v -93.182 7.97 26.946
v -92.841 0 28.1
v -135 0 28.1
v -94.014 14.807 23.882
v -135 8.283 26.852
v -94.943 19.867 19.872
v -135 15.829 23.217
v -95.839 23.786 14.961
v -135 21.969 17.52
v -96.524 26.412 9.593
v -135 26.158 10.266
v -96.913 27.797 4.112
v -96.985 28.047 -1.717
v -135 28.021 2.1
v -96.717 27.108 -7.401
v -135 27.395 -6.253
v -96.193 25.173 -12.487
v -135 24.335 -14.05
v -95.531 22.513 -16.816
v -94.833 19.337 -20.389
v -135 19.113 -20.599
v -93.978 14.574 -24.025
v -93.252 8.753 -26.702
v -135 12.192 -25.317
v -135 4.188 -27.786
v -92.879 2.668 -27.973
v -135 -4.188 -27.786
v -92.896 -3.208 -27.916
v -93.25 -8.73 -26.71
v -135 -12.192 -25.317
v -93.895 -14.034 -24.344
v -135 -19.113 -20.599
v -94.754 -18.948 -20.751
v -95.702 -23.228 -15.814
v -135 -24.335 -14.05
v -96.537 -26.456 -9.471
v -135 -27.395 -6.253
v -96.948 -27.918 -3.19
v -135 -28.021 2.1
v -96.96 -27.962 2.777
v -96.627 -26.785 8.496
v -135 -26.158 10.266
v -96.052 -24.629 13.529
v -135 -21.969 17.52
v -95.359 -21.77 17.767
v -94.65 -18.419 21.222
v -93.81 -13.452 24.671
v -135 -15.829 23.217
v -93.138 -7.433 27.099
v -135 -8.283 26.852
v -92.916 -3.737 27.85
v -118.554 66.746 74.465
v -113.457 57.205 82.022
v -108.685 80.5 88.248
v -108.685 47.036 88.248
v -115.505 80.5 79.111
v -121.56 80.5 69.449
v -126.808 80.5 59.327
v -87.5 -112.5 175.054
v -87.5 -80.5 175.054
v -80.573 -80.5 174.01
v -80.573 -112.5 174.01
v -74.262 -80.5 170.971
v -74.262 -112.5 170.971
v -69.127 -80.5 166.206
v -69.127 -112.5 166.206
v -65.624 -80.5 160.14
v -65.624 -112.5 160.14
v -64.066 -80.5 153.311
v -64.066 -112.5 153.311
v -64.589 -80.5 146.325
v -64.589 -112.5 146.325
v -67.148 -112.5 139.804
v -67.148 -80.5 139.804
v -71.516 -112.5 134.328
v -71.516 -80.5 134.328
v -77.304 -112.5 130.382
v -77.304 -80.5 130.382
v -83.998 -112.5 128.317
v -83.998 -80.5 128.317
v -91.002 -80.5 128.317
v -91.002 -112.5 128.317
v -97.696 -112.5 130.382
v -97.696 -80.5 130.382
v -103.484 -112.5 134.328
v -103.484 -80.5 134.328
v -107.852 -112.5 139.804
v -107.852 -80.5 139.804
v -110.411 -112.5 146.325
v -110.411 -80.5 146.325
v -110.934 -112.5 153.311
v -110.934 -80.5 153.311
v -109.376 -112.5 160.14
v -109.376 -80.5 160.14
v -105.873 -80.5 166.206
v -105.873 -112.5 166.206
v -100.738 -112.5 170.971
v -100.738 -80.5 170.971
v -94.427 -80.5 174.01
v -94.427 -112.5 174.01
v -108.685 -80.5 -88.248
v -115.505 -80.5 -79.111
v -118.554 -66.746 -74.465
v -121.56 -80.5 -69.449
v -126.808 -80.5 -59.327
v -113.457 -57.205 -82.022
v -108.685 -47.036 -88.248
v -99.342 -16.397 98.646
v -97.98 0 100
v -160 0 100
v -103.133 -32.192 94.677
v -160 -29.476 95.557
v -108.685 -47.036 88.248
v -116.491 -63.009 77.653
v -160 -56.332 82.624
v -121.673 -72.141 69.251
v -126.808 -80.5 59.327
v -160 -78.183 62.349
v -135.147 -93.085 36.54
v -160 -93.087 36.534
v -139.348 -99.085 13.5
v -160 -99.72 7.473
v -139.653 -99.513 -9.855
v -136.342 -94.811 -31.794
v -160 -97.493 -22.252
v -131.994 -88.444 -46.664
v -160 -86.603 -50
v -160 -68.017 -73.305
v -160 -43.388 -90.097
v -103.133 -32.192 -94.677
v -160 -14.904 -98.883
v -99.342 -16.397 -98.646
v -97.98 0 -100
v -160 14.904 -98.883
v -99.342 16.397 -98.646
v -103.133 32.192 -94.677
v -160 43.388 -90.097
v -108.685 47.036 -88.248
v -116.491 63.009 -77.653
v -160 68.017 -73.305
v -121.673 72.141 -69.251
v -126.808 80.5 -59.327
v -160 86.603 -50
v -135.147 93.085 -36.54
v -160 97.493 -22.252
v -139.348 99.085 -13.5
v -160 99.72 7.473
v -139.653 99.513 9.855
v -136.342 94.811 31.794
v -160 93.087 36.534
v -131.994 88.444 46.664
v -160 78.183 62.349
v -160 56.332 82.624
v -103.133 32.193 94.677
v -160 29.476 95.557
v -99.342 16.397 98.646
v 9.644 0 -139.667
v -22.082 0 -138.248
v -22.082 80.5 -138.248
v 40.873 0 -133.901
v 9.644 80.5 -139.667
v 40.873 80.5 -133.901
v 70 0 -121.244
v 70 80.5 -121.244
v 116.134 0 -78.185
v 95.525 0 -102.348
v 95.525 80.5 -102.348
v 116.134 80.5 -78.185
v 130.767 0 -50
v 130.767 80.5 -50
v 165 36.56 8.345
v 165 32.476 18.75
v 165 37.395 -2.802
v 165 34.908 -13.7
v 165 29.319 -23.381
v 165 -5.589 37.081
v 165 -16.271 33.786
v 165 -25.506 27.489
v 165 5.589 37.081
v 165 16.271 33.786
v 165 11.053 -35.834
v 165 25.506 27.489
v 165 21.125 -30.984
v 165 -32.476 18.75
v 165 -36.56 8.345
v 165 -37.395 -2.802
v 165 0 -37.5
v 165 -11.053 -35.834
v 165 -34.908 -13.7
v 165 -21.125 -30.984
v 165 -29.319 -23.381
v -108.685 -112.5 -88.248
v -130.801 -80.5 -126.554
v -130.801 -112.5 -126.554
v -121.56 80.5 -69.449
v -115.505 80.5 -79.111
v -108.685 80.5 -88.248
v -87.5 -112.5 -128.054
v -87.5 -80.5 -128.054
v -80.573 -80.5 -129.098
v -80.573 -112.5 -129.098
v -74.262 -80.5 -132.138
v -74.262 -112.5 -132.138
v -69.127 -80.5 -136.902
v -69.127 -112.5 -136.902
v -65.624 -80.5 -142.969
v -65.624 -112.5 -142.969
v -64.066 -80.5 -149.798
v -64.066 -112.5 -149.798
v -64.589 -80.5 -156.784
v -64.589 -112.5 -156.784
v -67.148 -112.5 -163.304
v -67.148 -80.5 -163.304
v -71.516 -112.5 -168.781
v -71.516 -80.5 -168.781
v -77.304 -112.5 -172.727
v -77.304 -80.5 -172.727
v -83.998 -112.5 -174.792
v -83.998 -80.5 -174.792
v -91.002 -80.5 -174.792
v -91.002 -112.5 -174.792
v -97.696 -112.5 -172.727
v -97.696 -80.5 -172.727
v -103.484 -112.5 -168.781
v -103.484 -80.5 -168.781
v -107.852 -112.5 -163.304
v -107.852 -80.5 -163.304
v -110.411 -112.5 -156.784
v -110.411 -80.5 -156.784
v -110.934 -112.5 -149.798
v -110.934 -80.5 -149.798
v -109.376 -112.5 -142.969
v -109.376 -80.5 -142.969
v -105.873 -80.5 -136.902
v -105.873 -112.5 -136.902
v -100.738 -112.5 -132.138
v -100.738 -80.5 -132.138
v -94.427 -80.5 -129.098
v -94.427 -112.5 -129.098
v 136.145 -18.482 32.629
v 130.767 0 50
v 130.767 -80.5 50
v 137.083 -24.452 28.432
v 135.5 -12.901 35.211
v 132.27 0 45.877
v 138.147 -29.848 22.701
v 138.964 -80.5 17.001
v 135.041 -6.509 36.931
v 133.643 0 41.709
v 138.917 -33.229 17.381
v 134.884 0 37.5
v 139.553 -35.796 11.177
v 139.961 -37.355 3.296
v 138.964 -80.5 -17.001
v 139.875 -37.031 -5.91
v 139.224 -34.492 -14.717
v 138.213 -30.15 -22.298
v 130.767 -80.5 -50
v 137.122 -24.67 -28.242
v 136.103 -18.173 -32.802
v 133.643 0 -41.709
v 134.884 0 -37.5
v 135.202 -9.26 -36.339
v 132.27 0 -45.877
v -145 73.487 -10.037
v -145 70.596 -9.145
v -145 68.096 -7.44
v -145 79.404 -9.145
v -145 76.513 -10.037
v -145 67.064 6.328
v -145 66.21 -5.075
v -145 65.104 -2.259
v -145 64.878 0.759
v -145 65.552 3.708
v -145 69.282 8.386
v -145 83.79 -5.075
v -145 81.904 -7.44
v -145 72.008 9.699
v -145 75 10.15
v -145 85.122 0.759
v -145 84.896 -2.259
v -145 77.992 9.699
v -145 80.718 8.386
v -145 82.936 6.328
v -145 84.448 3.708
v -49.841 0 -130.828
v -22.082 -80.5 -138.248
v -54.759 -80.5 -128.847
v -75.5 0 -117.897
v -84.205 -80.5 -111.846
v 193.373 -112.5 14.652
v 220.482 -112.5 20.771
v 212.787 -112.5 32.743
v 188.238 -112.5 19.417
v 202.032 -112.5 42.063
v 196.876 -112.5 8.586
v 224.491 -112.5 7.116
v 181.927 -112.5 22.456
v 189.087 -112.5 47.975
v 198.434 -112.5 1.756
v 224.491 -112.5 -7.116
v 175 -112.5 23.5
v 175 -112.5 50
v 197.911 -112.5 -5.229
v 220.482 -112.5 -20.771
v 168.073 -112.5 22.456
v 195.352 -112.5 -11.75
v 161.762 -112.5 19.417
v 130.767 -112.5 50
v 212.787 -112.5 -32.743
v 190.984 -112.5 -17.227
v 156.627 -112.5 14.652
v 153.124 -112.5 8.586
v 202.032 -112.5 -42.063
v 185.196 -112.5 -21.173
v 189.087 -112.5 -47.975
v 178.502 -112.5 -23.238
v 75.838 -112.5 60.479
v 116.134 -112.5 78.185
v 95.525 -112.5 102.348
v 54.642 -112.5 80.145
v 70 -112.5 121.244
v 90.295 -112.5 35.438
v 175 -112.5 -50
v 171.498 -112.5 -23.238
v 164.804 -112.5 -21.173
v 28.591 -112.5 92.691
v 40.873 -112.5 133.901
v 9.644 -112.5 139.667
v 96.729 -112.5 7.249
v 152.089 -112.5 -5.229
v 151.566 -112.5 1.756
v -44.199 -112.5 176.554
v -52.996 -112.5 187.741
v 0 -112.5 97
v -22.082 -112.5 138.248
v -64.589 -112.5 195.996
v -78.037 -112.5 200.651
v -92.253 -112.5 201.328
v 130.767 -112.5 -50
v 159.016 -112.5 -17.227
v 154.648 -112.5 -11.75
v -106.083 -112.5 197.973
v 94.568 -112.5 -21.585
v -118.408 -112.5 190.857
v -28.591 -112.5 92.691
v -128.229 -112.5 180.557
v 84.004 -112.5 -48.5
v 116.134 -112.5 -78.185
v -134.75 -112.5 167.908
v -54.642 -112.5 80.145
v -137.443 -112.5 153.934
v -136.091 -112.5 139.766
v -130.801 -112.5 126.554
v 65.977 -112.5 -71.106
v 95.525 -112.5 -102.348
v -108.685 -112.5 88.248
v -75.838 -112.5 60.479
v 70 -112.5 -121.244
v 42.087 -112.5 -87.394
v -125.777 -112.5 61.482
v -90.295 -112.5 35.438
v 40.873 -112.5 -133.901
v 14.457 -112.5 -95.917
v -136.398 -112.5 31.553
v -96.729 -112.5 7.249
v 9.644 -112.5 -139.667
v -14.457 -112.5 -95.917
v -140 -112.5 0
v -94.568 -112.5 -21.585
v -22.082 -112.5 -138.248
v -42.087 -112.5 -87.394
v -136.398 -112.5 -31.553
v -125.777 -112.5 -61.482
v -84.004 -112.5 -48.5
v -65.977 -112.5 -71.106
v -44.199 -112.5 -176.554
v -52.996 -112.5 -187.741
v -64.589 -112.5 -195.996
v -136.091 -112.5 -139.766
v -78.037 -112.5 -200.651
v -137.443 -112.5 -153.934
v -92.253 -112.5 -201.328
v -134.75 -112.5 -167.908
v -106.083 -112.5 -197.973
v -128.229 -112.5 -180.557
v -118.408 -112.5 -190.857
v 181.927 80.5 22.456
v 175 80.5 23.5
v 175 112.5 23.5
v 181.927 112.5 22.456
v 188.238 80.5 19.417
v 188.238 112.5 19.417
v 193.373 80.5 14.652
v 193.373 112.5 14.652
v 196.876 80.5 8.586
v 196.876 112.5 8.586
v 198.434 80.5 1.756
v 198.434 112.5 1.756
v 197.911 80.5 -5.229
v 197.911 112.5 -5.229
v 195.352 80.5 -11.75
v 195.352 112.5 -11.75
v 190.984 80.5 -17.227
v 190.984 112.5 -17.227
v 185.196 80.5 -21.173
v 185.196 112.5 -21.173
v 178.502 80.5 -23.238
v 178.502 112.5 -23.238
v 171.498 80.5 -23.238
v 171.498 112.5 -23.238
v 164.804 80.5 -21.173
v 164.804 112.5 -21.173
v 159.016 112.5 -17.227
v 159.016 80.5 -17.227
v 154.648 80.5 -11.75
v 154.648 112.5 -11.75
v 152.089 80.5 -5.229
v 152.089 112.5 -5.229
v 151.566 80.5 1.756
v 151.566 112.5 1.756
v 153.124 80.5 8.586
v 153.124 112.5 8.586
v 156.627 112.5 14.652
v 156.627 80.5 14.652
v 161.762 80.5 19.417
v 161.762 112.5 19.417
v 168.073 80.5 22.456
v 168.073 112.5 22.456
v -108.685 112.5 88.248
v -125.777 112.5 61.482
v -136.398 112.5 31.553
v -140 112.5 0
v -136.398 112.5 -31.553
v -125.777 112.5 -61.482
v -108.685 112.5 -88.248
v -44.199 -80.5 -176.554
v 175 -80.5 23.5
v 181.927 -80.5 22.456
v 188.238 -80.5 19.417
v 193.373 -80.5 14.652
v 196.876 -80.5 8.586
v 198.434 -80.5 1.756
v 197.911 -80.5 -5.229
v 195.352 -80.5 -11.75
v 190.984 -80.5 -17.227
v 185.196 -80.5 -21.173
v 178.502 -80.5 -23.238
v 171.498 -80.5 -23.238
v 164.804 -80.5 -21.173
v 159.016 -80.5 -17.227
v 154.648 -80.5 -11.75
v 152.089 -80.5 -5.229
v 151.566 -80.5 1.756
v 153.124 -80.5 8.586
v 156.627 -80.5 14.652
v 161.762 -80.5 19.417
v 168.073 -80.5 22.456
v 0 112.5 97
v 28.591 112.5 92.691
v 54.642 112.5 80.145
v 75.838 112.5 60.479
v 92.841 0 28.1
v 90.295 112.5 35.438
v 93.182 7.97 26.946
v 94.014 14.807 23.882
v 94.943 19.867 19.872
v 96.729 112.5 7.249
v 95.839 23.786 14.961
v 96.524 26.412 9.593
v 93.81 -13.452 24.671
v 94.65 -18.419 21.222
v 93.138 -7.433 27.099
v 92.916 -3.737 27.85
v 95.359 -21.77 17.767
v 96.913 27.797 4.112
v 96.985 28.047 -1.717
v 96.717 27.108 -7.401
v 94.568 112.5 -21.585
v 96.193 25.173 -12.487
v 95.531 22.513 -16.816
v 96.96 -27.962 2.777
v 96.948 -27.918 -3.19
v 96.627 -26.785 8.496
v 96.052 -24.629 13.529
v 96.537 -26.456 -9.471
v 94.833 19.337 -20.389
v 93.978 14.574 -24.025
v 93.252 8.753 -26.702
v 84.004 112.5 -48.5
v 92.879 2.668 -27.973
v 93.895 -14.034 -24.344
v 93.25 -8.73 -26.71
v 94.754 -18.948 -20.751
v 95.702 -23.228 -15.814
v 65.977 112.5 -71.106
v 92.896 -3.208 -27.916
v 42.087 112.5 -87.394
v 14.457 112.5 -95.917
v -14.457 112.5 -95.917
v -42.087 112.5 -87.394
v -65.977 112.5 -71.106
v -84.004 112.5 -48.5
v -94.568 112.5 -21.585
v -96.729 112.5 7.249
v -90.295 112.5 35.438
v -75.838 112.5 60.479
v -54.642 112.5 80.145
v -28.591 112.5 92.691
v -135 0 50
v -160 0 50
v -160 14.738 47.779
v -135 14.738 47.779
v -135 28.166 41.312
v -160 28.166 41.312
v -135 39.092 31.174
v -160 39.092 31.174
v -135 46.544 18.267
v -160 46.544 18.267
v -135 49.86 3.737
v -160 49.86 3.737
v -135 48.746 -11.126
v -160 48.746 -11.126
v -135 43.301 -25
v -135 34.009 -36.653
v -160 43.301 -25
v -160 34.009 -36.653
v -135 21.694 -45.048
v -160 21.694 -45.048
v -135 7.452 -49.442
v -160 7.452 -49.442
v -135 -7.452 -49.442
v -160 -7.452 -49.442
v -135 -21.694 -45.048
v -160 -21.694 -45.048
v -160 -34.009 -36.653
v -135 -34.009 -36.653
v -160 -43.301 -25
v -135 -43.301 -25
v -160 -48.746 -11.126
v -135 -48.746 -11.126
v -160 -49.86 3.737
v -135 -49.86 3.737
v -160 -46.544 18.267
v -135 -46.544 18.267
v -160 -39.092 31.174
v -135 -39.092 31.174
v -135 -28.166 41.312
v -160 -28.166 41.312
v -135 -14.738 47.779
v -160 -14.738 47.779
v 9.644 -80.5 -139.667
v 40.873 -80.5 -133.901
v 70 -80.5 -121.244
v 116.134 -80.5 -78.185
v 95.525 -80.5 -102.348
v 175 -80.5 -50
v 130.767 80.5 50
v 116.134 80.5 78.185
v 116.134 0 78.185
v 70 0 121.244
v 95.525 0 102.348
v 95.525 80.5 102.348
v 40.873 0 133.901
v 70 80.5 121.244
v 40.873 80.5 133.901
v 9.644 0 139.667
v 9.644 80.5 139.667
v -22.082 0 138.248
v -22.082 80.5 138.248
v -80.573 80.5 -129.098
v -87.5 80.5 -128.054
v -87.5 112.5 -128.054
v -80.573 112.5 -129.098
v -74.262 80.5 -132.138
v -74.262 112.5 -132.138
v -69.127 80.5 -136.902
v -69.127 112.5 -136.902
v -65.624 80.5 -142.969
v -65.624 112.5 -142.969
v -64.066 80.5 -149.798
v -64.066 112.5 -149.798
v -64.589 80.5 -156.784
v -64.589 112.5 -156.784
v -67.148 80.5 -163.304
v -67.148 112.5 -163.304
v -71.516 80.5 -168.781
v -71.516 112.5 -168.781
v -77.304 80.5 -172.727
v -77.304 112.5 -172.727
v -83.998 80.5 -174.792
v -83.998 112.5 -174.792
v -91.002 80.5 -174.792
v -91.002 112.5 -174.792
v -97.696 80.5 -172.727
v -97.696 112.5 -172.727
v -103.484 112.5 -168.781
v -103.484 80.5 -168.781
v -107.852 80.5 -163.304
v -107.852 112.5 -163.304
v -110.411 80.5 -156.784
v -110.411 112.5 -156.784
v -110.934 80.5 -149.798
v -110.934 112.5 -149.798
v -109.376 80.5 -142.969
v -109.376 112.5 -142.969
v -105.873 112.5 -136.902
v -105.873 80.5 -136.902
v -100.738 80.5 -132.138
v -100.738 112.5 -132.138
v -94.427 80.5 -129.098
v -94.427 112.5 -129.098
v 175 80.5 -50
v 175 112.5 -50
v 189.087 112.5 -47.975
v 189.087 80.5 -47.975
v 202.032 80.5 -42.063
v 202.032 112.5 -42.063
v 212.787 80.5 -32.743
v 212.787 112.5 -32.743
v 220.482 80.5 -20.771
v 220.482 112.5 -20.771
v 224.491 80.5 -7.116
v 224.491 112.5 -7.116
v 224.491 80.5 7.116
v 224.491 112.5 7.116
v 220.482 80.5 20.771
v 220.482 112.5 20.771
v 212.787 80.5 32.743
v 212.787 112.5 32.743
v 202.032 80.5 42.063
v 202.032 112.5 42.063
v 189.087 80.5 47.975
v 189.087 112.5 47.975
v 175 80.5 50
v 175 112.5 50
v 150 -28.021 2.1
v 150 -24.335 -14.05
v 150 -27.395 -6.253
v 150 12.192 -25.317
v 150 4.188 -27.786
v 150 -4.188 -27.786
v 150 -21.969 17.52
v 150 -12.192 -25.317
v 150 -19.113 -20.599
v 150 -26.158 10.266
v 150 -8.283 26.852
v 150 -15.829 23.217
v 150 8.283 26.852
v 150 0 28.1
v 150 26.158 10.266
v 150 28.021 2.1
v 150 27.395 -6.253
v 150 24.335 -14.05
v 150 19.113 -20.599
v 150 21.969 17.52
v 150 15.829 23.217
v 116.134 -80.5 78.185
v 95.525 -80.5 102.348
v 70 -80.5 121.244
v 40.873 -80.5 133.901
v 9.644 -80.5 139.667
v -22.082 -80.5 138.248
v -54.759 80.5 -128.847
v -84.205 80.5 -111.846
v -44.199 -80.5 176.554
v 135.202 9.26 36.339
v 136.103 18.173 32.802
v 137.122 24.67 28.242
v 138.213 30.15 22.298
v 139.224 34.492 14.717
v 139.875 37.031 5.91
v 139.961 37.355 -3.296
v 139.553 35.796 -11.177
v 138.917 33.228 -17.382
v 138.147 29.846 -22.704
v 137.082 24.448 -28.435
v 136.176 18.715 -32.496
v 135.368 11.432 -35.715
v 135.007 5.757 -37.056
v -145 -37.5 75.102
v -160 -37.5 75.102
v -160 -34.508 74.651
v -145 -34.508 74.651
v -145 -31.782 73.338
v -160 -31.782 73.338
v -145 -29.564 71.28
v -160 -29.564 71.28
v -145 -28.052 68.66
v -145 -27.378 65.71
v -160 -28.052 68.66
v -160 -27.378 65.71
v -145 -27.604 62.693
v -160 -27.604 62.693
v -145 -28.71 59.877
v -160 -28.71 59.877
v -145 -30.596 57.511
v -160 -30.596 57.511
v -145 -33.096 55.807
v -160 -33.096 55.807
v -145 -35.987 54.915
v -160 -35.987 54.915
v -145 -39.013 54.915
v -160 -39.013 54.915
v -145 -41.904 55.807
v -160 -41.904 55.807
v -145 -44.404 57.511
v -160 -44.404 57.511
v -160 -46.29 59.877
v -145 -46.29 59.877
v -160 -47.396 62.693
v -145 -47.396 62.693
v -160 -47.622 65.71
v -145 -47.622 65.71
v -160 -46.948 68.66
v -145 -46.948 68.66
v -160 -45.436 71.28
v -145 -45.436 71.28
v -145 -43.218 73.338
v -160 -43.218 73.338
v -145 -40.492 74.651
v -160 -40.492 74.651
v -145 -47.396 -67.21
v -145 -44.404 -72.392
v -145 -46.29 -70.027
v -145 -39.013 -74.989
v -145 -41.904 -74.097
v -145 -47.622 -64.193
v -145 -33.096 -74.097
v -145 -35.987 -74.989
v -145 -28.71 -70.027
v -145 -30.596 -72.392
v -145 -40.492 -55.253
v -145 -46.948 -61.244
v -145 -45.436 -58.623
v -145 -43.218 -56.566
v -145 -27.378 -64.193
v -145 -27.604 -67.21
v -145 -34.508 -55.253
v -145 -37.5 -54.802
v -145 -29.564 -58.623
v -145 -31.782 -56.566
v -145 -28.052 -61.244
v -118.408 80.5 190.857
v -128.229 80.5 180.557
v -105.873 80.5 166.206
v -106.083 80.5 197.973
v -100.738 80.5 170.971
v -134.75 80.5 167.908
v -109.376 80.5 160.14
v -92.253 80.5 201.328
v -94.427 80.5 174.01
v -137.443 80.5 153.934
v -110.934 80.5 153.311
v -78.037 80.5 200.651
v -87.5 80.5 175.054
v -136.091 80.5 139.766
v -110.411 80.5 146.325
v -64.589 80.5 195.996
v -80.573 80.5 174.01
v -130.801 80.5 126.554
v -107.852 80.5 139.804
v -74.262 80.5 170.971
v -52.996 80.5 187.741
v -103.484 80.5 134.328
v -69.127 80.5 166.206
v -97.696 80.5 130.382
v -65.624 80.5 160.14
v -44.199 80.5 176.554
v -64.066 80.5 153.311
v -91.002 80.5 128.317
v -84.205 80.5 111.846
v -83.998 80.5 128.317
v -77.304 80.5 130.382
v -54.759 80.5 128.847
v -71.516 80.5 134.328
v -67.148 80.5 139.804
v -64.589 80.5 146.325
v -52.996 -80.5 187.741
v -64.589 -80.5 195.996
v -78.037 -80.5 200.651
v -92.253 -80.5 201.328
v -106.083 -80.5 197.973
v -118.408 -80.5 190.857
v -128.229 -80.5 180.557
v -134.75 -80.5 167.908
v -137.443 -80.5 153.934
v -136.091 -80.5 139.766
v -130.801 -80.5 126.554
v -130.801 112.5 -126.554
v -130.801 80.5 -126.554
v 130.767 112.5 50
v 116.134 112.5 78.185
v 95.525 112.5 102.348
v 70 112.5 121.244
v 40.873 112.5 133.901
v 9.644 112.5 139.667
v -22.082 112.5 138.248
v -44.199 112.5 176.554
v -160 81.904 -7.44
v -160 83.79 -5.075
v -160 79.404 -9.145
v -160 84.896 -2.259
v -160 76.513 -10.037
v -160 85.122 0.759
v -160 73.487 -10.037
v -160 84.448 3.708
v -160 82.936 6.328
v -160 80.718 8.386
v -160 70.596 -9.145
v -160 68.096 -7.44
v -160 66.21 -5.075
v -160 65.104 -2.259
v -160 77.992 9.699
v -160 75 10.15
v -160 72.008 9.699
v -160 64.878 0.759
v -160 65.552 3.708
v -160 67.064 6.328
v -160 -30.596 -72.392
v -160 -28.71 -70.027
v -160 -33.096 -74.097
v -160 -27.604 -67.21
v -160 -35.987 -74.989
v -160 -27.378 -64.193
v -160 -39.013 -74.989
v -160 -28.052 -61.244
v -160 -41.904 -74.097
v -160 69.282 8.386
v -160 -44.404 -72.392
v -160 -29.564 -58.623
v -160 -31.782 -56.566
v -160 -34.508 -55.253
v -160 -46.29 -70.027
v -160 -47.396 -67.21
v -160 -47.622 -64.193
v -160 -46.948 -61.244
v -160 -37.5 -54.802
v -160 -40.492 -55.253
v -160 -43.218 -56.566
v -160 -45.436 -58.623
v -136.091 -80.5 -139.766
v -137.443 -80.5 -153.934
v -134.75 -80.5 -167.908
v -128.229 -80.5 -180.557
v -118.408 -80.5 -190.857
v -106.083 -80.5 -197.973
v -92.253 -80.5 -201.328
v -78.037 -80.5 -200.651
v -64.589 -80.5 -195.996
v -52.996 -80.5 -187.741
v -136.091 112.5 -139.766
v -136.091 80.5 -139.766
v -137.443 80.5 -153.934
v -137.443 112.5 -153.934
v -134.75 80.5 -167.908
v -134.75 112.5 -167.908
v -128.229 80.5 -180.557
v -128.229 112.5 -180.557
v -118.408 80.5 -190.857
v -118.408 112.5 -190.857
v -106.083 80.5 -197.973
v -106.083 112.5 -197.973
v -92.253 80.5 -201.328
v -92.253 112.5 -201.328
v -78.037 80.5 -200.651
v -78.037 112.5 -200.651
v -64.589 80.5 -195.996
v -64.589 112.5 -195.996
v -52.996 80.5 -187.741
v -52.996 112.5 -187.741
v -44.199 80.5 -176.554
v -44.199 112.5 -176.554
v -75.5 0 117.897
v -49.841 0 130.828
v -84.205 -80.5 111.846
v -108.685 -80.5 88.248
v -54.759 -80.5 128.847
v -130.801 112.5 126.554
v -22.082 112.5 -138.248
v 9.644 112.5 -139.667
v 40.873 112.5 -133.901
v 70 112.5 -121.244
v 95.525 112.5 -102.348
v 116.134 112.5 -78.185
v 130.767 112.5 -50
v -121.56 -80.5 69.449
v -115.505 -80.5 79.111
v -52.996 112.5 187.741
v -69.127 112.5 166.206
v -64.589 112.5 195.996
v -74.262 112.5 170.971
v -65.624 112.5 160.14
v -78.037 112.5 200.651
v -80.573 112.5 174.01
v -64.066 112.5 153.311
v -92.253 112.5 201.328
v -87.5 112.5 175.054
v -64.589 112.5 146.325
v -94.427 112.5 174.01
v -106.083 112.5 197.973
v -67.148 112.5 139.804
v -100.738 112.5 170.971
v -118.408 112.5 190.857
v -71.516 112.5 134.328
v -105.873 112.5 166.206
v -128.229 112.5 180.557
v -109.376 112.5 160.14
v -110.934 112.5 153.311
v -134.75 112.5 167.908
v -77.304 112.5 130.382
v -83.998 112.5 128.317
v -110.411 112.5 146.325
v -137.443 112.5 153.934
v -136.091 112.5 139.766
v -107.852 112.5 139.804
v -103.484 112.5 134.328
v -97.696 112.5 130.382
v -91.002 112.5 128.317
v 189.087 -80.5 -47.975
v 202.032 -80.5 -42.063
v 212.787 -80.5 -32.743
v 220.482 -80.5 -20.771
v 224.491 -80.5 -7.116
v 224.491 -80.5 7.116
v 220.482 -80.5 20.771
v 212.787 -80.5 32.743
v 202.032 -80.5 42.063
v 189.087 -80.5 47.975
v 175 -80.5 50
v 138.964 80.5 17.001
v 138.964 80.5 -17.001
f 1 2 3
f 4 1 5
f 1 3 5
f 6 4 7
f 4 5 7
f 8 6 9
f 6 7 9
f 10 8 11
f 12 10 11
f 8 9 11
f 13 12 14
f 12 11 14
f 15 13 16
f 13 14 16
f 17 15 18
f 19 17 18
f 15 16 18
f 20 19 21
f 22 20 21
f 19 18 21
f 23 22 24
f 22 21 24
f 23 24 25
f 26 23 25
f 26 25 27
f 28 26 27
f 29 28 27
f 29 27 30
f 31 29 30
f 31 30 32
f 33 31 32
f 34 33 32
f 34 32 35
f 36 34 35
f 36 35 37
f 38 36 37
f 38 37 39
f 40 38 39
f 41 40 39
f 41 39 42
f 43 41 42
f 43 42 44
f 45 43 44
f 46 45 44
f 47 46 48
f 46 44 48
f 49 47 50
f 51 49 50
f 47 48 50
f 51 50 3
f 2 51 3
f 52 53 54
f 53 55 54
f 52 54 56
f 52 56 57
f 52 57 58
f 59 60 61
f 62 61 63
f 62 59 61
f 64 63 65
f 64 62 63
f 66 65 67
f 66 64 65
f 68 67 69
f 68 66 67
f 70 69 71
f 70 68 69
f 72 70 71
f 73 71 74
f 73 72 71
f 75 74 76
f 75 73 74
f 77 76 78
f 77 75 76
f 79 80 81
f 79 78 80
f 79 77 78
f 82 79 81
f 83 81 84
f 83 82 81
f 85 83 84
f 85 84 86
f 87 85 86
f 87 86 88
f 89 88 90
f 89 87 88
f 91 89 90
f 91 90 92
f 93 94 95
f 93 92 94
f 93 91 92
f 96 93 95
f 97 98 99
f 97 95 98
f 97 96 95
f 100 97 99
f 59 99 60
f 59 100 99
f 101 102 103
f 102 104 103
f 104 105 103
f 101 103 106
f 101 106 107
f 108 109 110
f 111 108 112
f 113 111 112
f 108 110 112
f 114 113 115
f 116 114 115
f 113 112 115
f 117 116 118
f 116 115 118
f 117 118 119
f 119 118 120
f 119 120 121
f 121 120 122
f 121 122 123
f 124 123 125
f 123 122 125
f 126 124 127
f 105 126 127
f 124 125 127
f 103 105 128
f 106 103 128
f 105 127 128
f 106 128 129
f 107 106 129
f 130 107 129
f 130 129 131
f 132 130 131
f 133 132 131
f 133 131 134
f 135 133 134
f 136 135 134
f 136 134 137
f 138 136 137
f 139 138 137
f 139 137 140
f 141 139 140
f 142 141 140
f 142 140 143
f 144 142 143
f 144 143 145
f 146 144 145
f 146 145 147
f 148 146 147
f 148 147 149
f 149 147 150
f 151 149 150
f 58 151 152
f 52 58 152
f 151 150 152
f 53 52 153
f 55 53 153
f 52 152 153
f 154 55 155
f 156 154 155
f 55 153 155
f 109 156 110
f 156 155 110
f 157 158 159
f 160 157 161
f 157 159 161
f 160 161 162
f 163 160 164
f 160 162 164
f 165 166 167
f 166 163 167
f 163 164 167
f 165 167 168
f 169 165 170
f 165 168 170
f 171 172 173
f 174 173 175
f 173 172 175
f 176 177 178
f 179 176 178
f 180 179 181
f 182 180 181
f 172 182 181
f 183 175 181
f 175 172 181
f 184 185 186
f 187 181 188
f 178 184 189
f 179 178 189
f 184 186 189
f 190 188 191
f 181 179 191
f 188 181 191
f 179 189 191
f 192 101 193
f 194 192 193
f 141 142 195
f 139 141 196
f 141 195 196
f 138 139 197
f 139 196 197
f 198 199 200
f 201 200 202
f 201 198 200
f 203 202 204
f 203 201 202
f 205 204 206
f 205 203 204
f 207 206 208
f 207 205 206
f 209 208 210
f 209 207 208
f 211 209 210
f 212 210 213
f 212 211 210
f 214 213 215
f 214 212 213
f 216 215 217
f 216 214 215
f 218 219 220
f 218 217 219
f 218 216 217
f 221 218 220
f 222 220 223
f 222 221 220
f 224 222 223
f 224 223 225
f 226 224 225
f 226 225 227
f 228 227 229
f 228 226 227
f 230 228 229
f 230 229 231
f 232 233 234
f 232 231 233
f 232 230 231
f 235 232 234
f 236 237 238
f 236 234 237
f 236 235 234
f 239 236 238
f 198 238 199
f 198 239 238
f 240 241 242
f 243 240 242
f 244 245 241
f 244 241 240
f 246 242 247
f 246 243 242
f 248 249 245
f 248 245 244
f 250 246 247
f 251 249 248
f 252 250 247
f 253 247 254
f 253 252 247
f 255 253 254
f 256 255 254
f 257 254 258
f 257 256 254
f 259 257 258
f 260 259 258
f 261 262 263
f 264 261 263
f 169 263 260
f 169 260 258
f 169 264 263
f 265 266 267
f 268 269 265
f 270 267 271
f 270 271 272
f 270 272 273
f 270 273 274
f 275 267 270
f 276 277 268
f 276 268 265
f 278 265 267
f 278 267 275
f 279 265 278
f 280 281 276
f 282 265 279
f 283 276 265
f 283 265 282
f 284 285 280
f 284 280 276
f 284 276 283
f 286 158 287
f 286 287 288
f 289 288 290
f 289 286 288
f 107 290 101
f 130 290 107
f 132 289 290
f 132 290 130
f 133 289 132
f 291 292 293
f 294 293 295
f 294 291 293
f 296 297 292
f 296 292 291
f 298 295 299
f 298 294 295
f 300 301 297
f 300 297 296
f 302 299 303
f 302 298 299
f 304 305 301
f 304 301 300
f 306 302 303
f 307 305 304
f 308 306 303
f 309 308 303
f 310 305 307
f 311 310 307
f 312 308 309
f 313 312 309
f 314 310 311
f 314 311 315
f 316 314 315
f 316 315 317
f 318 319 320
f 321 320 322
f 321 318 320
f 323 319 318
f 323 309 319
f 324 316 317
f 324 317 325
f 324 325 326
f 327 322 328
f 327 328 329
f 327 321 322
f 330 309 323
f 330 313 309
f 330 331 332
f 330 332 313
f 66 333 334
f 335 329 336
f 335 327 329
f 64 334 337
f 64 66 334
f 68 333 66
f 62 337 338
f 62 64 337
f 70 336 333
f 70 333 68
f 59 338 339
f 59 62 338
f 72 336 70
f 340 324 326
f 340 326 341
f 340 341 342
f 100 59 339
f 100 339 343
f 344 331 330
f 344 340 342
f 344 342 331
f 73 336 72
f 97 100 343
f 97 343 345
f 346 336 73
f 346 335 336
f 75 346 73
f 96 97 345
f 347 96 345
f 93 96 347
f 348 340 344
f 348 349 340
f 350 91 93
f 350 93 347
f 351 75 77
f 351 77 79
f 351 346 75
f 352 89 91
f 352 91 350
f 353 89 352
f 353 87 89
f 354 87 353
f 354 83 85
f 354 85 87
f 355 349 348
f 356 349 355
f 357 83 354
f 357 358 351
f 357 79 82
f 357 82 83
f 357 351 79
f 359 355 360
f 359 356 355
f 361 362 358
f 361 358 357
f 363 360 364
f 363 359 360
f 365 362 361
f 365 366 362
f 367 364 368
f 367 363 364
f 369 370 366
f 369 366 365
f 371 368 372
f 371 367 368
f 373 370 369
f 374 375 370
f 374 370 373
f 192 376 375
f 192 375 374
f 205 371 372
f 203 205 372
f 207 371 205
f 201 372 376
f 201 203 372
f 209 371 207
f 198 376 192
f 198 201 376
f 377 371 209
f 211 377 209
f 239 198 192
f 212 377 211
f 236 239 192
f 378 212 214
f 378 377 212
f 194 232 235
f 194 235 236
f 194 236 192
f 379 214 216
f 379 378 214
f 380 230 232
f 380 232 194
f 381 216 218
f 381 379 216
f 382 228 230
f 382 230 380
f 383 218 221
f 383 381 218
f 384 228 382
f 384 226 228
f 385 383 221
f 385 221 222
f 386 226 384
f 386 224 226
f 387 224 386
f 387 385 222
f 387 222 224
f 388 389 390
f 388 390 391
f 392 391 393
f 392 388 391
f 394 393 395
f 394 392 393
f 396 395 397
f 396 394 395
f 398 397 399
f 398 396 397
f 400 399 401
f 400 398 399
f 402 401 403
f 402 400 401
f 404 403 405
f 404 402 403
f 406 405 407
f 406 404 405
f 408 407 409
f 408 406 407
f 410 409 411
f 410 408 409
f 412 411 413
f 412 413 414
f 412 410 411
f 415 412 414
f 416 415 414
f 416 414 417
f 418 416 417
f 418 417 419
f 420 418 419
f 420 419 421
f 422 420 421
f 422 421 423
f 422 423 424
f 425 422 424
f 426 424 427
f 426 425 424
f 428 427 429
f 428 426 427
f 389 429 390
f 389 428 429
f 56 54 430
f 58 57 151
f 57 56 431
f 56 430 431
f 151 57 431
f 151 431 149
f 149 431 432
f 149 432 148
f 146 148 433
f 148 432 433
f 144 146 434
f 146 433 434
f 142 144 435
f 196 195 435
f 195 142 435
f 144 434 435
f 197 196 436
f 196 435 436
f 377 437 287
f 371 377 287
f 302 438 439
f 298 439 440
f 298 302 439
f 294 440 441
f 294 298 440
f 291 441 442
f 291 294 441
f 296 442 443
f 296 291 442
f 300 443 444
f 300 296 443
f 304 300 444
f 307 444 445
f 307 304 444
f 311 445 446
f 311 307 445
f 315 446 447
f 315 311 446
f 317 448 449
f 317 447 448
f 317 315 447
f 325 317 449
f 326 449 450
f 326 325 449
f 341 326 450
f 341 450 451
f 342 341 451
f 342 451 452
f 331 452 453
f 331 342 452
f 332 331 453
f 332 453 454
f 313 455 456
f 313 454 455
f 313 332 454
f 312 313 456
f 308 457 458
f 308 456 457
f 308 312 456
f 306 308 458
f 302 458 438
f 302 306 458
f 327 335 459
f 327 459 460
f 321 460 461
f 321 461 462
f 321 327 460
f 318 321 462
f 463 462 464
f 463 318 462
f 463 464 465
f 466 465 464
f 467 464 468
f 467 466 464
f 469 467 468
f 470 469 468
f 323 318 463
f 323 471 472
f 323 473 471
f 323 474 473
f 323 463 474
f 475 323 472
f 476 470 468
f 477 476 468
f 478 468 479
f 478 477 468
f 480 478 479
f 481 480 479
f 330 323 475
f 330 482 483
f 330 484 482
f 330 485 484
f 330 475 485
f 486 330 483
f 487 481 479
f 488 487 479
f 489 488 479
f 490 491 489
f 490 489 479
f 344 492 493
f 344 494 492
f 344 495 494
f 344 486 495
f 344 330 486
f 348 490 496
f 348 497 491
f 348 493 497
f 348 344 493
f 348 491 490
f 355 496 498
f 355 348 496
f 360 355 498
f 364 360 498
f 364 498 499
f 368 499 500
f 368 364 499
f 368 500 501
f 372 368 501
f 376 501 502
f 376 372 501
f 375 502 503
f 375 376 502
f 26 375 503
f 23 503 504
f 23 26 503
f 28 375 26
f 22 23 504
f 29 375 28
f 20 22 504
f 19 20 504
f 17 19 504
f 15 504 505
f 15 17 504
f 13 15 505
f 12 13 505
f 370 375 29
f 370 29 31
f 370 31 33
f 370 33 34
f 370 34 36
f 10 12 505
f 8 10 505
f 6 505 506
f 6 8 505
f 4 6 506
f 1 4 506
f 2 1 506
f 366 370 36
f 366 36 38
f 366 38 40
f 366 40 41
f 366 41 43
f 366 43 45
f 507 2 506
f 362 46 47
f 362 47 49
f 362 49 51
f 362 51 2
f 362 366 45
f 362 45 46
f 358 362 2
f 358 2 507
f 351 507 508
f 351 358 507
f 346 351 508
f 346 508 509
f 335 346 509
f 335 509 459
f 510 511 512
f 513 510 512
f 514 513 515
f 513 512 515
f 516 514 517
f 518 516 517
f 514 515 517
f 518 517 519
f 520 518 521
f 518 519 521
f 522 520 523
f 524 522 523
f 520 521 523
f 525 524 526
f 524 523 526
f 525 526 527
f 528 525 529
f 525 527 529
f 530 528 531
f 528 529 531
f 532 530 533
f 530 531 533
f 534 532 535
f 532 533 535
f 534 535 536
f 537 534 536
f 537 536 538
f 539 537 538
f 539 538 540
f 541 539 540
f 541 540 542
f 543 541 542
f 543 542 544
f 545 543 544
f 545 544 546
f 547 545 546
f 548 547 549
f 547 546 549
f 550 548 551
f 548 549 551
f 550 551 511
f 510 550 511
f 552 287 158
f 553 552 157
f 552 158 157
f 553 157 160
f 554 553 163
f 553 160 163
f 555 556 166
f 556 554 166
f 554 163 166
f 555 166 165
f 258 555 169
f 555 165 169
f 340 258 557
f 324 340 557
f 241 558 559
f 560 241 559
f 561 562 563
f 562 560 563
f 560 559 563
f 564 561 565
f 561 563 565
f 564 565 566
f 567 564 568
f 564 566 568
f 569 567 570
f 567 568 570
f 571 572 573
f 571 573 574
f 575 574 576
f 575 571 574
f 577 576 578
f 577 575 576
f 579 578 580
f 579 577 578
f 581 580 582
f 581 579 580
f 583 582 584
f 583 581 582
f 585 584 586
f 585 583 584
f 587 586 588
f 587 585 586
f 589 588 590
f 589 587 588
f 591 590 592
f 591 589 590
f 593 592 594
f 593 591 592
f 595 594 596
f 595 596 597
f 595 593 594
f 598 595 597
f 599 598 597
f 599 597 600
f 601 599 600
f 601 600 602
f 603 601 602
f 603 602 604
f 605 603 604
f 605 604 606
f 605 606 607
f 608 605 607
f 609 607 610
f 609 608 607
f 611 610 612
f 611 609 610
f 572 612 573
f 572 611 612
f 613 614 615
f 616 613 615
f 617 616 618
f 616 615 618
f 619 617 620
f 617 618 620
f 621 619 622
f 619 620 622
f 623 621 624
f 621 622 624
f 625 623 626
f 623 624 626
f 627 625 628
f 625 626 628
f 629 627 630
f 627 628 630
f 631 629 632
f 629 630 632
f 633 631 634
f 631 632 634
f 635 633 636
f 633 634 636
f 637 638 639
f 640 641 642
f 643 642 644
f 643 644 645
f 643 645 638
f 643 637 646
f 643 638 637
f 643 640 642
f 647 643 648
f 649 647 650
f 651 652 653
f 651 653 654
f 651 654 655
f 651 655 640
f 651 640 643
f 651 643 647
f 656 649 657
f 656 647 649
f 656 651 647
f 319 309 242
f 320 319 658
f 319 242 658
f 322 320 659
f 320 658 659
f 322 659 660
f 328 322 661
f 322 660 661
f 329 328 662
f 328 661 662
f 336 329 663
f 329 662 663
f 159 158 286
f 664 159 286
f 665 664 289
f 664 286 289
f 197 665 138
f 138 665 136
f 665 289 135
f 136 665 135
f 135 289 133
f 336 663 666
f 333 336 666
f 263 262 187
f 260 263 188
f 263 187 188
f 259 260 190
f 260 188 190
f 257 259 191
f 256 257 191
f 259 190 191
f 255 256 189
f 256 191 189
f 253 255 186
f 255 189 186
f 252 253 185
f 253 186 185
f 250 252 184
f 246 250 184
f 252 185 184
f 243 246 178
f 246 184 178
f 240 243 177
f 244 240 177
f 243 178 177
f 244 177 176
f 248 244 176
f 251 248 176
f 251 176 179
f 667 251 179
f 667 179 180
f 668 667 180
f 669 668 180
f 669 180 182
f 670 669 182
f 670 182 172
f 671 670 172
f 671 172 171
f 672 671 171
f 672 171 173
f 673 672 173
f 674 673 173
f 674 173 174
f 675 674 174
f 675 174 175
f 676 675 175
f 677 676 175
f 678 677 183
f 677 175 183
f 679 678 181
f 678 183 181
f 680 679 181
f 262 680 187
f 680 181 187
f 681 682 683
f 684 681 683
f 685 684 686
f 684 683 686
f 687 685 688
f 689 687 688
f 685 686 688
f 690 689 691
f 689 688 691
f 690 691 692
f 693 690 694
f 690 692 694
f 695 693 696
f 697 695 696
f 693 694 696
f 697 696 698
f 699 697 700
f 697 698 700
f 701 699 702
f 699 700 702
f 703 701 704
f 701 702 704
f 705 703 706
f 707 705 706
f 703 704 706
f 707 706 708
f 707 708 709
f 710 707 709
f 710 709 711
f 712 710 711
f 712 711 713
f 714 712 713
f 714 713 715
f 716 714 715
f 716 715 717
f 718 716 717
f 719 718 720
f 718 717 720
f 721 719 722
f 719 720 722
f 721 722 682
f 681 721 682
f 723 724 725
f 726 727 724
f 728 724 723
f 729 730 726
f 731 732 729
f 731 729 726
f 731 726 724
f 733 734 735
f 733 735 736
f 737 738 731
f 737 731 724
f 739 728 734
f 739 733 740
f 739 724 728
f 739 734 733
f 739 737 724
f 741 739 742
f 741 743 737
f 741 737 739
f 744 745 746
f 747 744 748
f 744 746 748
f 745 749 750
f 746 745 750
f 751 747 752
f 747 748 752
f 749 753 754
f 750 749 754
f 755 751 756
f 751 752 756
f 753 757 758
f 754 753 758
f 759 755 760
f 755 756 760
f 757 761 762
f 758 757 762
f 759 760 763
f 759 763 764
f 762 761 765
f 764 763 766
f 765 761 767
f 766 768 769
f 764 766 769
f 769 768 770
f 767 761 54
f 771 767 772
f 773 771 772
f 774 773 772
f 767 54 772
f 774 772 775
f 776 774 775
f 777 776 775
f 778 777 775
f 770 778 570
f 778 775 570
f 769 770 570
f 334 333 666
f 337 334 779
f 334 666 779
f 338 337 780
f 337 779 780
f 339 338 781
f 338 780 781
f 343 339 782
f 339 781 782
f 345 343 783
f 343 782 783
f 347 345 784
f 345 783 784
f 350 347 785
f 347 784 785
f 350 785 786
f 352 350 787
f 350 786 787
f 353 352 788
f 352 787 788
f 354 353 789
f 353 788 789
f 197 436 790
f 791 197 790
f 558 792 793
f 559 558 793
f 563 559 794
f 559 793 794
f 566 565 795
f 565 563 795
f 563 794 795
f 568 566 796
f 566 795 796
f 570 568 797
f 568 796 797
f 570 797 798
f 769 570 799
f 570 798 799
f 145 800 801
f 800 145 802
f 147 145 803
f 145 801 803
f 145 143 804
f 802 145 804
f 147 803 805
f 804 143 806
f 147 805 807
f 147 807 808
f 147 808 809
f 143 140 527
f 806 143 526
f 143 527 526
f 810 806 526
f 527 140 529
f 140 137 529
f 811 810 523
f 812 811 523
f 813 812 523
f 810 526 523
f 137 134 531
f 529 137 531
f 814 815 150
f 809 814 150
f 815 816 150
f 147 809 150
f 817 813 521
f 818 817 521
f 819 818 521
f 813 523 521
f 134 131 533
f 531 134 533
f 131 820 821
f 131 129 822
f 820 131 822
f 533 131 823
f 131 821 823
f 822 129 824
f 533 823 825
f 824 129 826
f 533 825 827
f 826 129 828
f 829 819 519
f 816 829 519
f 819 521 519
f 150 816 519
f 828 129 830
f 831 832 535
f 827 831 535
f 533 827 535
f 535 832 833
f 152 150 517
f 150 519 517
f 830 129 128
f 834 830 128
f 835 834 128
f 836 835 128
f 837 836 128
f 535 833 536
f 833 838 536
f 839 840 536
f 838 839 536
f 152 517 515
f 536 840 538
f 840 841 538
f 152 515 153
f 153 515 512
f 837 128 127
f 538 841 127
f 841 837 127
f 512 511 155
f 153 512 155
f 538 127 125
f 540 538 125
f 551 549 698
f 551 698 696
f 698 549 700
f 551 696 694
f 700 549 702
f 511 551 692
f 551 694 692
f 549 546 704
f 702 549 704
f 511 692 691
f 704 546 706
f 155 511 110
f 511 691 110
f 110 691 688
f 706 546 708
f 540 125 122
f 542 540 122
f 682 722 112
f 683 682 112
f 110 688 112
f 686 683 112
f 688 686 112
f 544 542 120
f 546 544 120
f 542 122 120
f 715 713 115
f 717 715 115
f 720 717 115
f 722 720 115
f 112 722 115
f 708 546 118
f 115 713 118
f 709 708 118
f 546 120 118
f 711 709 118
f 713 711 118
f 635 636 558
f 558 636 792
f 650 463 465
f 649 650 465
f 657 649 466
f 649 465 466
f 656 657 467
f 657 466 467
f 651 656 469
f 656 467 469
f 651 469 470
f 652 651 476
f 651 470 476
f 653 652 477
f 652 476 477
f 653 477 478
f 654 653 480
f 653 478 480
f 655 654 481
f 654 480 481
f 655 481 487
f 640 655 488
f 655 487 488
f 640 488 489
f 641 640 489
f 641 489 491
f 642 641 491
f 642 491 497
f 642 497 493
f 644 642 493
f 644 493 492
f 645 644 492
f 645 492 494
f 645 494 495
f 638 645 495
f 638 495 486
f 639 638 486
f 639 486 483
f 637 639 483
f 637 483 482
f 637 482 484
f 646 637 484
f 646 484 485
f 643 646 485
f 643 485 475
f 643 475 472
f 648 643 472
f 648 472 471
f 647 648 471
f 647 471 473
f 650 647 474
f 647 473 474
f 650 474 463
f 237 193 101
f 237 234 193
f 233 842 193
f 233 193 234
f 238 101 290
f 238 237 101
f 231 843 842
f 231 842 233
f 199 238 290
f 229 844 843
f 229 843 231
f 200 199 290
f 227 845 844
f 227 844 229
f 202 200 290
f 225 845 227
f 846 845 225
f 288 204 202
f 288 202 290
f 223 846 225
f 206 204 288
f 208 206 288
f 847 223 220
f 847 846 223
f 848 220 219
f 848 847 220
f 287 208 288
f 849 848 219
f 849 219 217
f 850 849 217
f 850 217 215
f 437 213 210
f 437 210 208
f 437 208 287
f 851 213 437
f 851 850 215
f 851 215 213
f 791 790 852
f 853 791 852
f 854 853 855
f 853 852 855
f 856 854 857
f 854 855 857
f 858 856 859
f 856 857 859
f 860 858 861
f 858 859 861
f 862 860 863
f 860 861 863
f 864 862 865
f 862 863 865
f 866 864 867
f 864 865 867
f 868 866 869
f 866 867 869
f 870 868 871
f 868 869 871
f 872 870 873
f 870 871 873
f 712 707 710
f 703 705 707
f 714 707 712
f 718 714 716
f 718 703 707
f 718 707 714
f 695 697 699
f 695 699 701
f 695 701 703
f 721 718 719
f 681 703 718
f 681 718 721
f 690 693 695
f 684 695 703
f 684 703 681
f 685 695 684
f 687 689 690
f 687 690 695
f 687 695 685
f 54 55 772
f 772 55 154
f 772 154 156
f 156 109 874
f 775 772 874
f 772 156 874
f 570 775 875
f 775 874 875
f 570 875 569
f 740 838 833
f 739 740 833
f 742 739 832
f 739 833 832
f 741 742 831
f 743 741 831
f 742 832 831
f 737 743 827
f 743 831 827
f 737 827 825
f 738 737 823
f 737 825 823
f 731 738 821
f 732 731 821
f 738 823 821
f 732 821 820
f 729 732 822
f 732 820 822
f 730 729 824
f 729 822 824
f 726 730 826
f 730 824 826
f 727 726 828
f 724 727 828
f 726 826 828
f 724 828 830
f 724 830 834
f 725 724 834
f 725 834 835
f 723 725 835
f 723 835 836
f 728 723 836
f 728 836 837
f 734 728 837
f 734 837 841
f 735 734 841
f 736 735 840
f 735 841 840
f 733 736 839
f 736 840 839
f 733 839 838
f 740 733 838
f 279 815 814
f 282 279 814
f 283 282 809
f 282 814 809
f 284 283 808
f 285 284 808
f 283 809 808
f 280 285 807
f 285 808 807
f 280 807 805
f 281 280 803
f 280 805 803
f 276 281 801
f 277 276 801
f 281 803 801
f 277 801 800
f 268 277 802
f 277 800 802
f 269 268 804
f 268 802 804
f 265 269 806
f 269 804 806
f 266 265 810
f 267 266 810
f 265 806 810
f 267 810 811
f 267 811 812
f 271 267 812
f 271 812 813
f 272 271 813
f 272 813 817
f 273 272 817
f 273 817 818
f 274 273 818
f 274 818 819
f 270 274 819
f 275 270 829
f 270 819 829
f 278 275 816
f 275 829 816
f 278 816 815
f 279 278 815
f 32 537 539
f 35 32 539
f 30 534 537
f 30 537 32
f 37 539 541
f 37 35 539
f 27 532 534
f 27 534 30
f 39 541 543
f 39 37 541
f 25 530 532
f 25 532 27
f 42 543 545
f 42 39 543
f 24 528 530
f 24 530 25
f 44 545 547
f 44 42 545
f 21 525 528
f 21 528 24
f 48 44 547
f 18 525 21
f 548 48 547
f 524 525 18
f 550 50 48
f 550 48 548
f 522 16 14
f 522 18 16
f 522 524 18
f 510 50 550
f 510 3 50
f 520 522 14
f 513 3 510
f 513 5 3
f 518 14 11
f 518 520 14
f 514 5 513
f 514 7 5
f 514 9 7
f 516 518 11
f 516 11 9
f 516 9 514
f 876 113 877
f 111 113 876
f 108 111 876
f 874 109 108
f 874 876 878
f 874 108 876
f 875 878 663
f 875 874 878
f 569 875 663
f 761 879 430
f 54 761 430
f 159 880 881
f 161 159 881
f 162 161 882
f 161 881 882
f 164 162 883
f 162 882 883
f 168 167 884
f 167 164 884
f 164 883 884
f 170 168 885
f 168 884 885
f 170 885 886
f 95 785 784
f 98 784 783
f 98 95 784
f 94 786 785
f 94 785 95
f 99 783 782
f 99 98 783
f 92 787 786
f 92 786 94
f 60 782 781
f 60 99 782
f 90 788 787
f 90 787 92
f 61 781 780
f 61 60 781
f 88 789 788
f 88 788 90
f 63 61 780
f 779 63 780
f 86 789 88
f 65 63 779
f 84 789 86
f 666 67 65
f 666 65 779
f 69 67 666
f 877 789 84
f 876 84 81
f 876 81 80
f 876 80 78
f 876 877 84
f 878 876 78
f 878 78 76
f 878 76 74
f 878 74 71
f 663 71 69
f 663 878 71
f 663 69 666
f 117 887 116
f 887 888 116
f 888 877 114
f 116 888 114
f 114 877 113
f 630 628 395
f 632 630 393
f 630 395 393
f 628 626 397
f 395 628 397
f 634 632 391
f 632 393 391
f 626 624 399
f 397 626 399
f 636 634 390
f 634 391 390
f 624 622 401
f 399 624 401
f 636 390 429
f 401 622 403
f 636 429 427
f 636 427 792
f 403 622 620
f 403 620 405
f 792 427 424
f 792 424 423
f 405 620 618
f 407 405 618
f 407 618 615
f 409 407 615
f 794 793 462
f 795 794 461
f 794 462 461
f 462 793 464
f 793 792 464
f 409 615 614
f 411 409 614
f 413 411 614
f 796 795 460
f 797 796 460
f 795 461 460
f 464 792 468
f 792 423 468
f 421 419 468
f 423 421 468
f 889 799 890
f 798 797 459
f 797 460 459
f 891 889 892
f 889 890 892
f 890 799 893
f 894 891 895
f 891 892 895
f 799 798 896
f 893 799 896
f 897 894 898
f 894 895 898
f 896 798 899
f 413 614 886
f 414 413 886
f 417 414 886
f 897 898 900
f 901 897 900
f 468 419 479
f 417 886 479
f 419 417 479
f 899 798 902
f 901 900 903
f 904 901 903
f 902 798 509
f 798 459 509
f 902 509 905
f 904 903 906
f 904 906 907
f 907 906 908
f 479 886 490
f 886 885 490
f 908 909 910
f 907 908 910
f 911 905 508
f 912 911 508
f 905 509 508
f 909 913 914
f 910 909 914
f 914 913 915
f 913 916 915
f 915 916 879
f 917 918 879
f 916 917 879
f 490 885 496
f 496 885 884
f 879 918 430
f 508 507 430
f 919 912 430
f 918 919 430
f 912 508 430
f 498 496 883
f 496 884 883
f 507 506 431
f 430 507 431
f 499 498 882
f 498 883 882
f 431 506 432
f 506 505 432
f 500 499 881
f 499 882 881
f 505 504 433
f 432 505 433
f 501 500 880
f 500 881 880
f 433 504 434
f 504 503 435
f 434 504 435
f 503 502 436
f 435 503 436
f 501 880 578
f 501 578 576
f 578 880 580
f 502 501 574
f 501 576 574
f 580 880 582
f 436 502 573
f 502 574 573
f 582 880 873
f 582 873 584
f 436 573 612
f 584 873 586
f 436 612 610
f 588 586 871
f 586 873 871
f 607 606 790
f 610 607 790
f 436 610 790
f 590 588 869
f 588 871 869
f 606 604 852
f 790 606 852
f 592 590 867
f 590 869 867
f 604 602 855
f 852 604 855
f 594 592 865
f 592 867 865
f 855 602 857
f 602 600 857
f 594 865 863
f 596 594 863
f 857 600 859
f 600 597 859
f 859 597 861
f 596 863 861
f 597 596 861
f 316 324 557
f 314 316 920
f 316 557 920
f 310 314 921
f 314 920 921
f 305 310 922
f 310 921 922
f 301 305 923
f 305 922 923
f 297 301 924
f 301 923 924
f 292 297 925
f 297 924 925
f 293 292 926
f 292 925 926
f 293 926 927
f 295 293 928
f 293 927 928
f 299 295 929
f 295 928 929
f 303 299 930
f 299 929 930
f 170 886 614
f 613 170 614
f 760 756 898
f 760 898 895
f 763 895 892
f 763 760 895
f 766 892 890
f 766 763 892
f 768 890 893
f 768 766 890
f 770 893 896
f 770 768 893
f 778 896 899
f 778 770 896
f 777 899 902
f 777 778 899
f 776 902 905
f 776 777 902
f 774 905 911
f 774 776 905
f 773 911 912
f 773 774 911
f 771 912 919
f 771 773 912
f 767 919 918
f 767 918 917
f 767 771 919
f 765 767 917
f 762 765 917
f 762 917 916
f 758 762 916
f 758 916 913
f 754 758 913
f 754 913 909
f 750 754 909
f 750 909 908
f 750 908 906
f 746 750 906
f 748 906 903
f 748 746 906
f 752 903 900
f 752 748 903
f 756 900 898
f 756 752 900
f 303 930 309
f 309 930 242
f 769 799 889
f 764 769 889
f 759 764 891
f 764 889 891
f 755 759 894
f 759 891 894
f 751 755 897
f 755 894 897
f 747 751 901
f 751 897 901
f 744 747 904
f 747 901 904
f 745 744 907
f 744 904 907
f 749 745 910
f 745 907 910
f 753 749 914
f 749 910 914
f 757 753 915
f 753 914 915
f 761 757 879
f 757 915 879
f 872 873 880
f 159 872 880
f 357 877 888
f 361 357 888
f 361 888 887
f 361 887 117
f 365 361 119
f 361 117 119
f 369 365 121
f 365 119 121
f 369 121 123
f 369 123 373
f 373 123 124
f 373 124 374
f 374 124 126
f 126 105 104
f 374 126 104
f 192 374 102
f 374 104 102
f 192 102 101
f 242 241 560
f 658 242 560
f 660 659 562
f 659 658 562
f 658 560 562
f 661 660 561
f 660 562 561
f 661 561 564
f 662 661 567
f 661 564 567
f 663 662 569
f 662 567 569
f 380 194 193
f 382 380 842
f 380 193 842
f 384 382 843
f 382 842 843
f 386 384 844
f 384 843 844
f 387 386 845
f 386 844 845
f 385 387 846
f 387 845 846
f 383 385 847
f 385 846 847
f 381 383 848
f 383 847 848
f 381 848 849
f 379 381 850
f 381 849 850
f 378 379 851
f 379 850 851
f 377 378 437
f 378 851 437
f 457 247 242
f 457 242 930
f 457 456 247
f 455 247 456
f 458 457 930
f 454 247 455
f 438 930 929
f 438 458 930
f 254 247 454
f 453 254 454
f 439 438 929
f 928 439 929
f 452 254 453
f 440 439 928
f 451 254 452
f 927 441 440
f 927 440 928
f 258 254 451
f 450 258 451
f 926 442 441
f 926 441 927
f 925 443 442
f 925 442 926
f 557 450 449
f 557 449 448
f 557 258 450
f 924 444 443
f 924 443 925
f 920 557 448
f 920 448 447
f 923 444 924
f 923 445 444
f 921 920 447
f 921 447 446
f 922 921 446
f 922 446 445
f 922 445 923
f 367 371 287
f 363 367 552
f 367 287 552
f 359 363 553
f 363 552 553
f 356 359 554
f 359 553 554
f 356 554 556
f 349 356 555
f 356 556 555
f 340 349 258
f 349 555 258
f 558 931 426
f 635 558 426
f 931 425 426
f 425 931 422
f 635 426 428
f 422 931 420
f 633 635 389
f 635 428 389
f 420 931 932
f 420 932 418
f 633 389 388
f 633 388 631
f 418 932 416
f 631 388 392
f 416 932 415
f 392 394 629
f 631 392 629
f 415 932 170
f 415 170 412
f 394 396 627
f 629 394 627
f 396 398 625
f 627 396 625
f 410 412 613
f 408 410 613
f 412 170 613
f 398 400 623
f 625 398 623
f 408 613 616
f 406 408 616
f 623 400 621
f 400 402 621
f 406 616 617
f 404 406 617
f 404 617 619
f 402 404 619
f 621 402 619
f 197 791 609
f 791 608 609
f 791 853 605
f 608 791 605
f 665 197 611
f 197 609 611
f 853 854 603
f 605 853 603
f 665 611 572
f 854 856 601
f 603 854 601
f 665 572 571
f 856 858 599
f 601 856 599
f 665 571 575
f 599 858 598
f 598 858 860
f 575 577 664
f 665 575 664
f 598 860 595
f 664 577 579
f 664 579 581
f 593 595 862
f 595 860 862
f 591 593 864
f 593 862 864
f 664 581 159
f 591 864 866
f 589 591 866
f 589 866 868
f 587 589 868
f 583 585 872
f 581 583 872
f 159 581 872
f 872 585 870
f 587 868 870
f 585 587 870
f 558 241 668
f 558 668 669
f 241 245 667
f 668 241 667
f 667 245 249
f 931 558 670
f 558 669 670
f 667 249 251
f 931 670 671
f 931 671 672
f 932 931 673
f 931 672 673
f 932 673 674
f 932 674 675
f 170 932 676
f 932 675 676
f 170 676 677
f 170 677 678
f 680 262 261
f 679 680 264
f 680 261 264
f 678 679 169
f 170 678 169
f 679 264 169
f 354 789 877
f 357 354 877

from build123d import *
from build123d.topology import SkipClean

# Parameters (mm, degrees)
SKETCH1_R                = 97
SKETCH1_R_2              = 23.5
BOSS_EXTRUDE1_DEPTH      = 112.5
SKETCH2_R                = 250
SKETCH2_R_2              = 140
CUT_EXTRUDE8_DEPTH       = 80.5
BOSS_EXTRUDE2_START      = -160
SKETCH4_R                = 100
BOSS_EXTRUDE2_DEPTH      = 62.02041
SKETCH5_R                = 10.15
CUT_EXTRUDE9_DEPTH       = 15
SKETCH6_R                = 50
CUT_EXTRUDE10_DEPTH      = 25
BOSS_EXTRUDE3_REACH      = 775.894
BOSS_EXTRUDE3_END_RADIUS = 140
BOSS_EXTRUDE3_START      = -325
SKETCH7_R                = 37.5
SKETCH8_R                = 28.1
CUT_EXTRUDE11_DEPTH      = 310


with BuildPart() as part:
    # Sketch1 → Boss-Extrude1 (new, symmetric)
    with BuildSketch(Plane(origin=(0, 0, 0), x_dir=(1, 0, 0), z_dir=(0, 1, 0))):
        with BuildLine():
            Line((130.766968306, 50), (175, 50))
            ThreePointArc((175, 50), (225, 0), (175, -50))
            Line((175, -50), (130.766968306, -50))
            ThreePointArc((130.766968306, -50), (70, -121.24355653), (-22.082213964, -138.247516529))
            Line((-22.082213964, -138.247516529), (-44.198729811, -176.554445662))
            ThreePointArc((-44.198729811, -176.554445662), (-112.5, -194.855715851), (-130.801270189, -126.554445662))
            Line((-130.801270189, -126.554445662), (-108.684754342, -88.247516529))
            ThreePointArc((-108.684754342, -88.247516529), (-140, 0), (-108.684754342, 88.247516529))
            Line((-108.684754342, 88.247516529), (-130.801270189, 126.554445662))
            ThreePointArc((-130.801270189, 126.554445662), (-112.5, 194.855715851), (-44.198729811, 176.554445662))
            Line((-44.198729811, 176.554445662), (-22.082213964, 138.247516529))
            ThreePointArc((-22.082213964, 138.247516529), (70, 121.24355653), (130.766968306, 50))
        make_face()
        with Locations(Location((0, 0, 0), (0, 0, 270))):
            Circle(SKETCH1_R, mode=Mode.SUBTRACT)
        with Locations(Location((175, 0, 0), (0, 0, 270))):
            Circle(SKETCH1_R_2, mode=Mode.SUBTRACT)
        with Locations(Location((-87.5, -151.554445662, 0), (0, 0, 270))):
            Circle(SKETCH1_R_2, mode=Mode.SUBTRACT)
        with Locations(Location((-87.5, 151.554445662, 0), (0, 0, 270))):
            Circle(SKETCH1_R_2, mode=Mode.SUBTRACT)
    extrude(amount=BOSS_EXTRUDE1_DEPTH, both=True)

    # Sketch2 → Cut-Extrude8 (cut, symmetric)
    with SkipClean():  # the faces are left unmerged after this step: merging them gives an invalid solid
        with BuildSketch(Plane(origin=(0, 0, 0), x_dir=(1, 0, 0), z_dir=(0, 1, 0))):
            Circle(SKETCH2_R)
            with Locations(Location((0, 0, 0), (0, 0, 99.075167572))):
                Circle(SKETCH2_R_2, mode=Mode.SUBTRACT)
        extrude(amount=CUT_EXTRUDE8_DEPTH, both=True, mode=Mode.SUBTRACT)

    # Sketch4 → Boss-Extrude2 (add)
    with SkipClean():  # the faces are left unmerged after this step: merging them gives an invalid solid
        with BuildSketch(Plane(origin=(0, 0, 0), x_dir=(0, 0, -1), z_dir=(1, 0, 0)).offset(BOSS_EXTRUDE2_START)):
            with Locations(Location((0, 0, 0), (0, 0, 180))):
                Circle(SKETCH4_R)
        extrude(amount=BOSS_EXTRUDE2_DEPTH)

    # Sketch5 → Cut-Extrude9 (cut)
    with SkipClean():  # the faces are left unmerged after this step: merging them gives an invalid solid
        with BuildSketch(Plane.ZY.offset(160)):
            with Locations((0, 75)):
                Circle(SKETCH5_R)
            with Locations((64.951905284, -37.5)):
                Circle(SKETCH5_R)
            with Locations((-64.951905284, -37.5)):
                Circle(SKETCH5_R)
        extrude(amount=-CUT_EXTRUDE9_DEPTH, mode=Mode.SUBTRACT)

    # Sketch6 → Cut-Extrude10 (cut)
    with SkipClean():  # the faces are left unmerged after this step: merging them gives an invalid solid
        with BuildSketch(Plane.ZY.offset(160)):
            Circle(SKETCH6_R)
        extrude(amount=-CUT_EXTRUDE10_DEPTH, mode=Mode.SUBTRACT)

    # Boss-Extrude3: up to this cylinder (the profile starts outside it)
    with SkipClean():  # the faces are left unmerged after this step: merging them gives an invalid solid
        boss_extrude3_end = Plane(origin=(0, 0, 0), z_dir=(0, -1, 0)) * Cylinder(BOSS_EXTRUDE3_END_RADIUS, 1832.788, mode=Mode.PRIVATE)
        # Sketch7 → Boss-Extrude3 (add, up to the surface)
        with BuildSketch(Plane.ZY.offset(160).offset(BOSS_EXTRUDE3_START), mode=Mode.PRIVATE) as boss_extrude3_sk1:
            with Locations(Location((0, 0, 0), (0, 0, 180))):
                Circle(SKETCH7_R)
        boss_extrude3_tool1 = extrude(boss_extrude3_sk1.sketch, amount=BOSS_EXTRUDE3_REACH, mode=Mode.PRIVATE) - boss_extrude3_end
        add(boss_extrude3_tool1.solids().sort_by_distance((165, 0, 0))[0])

    # Sketch8 → Cut-Extrude11 (cut)
    with SkipClean():  # the faces are left unmerged after this step: merging them gives an invalid solid
        with BuildSketch(Plane.ZY.offset(160)):
            Circle(SKETCH8_R)
        extrude(amount=-CUT_EXTRUDE11_DEPTH, mode=Mode.SUBTRACT)


solid = part.part
